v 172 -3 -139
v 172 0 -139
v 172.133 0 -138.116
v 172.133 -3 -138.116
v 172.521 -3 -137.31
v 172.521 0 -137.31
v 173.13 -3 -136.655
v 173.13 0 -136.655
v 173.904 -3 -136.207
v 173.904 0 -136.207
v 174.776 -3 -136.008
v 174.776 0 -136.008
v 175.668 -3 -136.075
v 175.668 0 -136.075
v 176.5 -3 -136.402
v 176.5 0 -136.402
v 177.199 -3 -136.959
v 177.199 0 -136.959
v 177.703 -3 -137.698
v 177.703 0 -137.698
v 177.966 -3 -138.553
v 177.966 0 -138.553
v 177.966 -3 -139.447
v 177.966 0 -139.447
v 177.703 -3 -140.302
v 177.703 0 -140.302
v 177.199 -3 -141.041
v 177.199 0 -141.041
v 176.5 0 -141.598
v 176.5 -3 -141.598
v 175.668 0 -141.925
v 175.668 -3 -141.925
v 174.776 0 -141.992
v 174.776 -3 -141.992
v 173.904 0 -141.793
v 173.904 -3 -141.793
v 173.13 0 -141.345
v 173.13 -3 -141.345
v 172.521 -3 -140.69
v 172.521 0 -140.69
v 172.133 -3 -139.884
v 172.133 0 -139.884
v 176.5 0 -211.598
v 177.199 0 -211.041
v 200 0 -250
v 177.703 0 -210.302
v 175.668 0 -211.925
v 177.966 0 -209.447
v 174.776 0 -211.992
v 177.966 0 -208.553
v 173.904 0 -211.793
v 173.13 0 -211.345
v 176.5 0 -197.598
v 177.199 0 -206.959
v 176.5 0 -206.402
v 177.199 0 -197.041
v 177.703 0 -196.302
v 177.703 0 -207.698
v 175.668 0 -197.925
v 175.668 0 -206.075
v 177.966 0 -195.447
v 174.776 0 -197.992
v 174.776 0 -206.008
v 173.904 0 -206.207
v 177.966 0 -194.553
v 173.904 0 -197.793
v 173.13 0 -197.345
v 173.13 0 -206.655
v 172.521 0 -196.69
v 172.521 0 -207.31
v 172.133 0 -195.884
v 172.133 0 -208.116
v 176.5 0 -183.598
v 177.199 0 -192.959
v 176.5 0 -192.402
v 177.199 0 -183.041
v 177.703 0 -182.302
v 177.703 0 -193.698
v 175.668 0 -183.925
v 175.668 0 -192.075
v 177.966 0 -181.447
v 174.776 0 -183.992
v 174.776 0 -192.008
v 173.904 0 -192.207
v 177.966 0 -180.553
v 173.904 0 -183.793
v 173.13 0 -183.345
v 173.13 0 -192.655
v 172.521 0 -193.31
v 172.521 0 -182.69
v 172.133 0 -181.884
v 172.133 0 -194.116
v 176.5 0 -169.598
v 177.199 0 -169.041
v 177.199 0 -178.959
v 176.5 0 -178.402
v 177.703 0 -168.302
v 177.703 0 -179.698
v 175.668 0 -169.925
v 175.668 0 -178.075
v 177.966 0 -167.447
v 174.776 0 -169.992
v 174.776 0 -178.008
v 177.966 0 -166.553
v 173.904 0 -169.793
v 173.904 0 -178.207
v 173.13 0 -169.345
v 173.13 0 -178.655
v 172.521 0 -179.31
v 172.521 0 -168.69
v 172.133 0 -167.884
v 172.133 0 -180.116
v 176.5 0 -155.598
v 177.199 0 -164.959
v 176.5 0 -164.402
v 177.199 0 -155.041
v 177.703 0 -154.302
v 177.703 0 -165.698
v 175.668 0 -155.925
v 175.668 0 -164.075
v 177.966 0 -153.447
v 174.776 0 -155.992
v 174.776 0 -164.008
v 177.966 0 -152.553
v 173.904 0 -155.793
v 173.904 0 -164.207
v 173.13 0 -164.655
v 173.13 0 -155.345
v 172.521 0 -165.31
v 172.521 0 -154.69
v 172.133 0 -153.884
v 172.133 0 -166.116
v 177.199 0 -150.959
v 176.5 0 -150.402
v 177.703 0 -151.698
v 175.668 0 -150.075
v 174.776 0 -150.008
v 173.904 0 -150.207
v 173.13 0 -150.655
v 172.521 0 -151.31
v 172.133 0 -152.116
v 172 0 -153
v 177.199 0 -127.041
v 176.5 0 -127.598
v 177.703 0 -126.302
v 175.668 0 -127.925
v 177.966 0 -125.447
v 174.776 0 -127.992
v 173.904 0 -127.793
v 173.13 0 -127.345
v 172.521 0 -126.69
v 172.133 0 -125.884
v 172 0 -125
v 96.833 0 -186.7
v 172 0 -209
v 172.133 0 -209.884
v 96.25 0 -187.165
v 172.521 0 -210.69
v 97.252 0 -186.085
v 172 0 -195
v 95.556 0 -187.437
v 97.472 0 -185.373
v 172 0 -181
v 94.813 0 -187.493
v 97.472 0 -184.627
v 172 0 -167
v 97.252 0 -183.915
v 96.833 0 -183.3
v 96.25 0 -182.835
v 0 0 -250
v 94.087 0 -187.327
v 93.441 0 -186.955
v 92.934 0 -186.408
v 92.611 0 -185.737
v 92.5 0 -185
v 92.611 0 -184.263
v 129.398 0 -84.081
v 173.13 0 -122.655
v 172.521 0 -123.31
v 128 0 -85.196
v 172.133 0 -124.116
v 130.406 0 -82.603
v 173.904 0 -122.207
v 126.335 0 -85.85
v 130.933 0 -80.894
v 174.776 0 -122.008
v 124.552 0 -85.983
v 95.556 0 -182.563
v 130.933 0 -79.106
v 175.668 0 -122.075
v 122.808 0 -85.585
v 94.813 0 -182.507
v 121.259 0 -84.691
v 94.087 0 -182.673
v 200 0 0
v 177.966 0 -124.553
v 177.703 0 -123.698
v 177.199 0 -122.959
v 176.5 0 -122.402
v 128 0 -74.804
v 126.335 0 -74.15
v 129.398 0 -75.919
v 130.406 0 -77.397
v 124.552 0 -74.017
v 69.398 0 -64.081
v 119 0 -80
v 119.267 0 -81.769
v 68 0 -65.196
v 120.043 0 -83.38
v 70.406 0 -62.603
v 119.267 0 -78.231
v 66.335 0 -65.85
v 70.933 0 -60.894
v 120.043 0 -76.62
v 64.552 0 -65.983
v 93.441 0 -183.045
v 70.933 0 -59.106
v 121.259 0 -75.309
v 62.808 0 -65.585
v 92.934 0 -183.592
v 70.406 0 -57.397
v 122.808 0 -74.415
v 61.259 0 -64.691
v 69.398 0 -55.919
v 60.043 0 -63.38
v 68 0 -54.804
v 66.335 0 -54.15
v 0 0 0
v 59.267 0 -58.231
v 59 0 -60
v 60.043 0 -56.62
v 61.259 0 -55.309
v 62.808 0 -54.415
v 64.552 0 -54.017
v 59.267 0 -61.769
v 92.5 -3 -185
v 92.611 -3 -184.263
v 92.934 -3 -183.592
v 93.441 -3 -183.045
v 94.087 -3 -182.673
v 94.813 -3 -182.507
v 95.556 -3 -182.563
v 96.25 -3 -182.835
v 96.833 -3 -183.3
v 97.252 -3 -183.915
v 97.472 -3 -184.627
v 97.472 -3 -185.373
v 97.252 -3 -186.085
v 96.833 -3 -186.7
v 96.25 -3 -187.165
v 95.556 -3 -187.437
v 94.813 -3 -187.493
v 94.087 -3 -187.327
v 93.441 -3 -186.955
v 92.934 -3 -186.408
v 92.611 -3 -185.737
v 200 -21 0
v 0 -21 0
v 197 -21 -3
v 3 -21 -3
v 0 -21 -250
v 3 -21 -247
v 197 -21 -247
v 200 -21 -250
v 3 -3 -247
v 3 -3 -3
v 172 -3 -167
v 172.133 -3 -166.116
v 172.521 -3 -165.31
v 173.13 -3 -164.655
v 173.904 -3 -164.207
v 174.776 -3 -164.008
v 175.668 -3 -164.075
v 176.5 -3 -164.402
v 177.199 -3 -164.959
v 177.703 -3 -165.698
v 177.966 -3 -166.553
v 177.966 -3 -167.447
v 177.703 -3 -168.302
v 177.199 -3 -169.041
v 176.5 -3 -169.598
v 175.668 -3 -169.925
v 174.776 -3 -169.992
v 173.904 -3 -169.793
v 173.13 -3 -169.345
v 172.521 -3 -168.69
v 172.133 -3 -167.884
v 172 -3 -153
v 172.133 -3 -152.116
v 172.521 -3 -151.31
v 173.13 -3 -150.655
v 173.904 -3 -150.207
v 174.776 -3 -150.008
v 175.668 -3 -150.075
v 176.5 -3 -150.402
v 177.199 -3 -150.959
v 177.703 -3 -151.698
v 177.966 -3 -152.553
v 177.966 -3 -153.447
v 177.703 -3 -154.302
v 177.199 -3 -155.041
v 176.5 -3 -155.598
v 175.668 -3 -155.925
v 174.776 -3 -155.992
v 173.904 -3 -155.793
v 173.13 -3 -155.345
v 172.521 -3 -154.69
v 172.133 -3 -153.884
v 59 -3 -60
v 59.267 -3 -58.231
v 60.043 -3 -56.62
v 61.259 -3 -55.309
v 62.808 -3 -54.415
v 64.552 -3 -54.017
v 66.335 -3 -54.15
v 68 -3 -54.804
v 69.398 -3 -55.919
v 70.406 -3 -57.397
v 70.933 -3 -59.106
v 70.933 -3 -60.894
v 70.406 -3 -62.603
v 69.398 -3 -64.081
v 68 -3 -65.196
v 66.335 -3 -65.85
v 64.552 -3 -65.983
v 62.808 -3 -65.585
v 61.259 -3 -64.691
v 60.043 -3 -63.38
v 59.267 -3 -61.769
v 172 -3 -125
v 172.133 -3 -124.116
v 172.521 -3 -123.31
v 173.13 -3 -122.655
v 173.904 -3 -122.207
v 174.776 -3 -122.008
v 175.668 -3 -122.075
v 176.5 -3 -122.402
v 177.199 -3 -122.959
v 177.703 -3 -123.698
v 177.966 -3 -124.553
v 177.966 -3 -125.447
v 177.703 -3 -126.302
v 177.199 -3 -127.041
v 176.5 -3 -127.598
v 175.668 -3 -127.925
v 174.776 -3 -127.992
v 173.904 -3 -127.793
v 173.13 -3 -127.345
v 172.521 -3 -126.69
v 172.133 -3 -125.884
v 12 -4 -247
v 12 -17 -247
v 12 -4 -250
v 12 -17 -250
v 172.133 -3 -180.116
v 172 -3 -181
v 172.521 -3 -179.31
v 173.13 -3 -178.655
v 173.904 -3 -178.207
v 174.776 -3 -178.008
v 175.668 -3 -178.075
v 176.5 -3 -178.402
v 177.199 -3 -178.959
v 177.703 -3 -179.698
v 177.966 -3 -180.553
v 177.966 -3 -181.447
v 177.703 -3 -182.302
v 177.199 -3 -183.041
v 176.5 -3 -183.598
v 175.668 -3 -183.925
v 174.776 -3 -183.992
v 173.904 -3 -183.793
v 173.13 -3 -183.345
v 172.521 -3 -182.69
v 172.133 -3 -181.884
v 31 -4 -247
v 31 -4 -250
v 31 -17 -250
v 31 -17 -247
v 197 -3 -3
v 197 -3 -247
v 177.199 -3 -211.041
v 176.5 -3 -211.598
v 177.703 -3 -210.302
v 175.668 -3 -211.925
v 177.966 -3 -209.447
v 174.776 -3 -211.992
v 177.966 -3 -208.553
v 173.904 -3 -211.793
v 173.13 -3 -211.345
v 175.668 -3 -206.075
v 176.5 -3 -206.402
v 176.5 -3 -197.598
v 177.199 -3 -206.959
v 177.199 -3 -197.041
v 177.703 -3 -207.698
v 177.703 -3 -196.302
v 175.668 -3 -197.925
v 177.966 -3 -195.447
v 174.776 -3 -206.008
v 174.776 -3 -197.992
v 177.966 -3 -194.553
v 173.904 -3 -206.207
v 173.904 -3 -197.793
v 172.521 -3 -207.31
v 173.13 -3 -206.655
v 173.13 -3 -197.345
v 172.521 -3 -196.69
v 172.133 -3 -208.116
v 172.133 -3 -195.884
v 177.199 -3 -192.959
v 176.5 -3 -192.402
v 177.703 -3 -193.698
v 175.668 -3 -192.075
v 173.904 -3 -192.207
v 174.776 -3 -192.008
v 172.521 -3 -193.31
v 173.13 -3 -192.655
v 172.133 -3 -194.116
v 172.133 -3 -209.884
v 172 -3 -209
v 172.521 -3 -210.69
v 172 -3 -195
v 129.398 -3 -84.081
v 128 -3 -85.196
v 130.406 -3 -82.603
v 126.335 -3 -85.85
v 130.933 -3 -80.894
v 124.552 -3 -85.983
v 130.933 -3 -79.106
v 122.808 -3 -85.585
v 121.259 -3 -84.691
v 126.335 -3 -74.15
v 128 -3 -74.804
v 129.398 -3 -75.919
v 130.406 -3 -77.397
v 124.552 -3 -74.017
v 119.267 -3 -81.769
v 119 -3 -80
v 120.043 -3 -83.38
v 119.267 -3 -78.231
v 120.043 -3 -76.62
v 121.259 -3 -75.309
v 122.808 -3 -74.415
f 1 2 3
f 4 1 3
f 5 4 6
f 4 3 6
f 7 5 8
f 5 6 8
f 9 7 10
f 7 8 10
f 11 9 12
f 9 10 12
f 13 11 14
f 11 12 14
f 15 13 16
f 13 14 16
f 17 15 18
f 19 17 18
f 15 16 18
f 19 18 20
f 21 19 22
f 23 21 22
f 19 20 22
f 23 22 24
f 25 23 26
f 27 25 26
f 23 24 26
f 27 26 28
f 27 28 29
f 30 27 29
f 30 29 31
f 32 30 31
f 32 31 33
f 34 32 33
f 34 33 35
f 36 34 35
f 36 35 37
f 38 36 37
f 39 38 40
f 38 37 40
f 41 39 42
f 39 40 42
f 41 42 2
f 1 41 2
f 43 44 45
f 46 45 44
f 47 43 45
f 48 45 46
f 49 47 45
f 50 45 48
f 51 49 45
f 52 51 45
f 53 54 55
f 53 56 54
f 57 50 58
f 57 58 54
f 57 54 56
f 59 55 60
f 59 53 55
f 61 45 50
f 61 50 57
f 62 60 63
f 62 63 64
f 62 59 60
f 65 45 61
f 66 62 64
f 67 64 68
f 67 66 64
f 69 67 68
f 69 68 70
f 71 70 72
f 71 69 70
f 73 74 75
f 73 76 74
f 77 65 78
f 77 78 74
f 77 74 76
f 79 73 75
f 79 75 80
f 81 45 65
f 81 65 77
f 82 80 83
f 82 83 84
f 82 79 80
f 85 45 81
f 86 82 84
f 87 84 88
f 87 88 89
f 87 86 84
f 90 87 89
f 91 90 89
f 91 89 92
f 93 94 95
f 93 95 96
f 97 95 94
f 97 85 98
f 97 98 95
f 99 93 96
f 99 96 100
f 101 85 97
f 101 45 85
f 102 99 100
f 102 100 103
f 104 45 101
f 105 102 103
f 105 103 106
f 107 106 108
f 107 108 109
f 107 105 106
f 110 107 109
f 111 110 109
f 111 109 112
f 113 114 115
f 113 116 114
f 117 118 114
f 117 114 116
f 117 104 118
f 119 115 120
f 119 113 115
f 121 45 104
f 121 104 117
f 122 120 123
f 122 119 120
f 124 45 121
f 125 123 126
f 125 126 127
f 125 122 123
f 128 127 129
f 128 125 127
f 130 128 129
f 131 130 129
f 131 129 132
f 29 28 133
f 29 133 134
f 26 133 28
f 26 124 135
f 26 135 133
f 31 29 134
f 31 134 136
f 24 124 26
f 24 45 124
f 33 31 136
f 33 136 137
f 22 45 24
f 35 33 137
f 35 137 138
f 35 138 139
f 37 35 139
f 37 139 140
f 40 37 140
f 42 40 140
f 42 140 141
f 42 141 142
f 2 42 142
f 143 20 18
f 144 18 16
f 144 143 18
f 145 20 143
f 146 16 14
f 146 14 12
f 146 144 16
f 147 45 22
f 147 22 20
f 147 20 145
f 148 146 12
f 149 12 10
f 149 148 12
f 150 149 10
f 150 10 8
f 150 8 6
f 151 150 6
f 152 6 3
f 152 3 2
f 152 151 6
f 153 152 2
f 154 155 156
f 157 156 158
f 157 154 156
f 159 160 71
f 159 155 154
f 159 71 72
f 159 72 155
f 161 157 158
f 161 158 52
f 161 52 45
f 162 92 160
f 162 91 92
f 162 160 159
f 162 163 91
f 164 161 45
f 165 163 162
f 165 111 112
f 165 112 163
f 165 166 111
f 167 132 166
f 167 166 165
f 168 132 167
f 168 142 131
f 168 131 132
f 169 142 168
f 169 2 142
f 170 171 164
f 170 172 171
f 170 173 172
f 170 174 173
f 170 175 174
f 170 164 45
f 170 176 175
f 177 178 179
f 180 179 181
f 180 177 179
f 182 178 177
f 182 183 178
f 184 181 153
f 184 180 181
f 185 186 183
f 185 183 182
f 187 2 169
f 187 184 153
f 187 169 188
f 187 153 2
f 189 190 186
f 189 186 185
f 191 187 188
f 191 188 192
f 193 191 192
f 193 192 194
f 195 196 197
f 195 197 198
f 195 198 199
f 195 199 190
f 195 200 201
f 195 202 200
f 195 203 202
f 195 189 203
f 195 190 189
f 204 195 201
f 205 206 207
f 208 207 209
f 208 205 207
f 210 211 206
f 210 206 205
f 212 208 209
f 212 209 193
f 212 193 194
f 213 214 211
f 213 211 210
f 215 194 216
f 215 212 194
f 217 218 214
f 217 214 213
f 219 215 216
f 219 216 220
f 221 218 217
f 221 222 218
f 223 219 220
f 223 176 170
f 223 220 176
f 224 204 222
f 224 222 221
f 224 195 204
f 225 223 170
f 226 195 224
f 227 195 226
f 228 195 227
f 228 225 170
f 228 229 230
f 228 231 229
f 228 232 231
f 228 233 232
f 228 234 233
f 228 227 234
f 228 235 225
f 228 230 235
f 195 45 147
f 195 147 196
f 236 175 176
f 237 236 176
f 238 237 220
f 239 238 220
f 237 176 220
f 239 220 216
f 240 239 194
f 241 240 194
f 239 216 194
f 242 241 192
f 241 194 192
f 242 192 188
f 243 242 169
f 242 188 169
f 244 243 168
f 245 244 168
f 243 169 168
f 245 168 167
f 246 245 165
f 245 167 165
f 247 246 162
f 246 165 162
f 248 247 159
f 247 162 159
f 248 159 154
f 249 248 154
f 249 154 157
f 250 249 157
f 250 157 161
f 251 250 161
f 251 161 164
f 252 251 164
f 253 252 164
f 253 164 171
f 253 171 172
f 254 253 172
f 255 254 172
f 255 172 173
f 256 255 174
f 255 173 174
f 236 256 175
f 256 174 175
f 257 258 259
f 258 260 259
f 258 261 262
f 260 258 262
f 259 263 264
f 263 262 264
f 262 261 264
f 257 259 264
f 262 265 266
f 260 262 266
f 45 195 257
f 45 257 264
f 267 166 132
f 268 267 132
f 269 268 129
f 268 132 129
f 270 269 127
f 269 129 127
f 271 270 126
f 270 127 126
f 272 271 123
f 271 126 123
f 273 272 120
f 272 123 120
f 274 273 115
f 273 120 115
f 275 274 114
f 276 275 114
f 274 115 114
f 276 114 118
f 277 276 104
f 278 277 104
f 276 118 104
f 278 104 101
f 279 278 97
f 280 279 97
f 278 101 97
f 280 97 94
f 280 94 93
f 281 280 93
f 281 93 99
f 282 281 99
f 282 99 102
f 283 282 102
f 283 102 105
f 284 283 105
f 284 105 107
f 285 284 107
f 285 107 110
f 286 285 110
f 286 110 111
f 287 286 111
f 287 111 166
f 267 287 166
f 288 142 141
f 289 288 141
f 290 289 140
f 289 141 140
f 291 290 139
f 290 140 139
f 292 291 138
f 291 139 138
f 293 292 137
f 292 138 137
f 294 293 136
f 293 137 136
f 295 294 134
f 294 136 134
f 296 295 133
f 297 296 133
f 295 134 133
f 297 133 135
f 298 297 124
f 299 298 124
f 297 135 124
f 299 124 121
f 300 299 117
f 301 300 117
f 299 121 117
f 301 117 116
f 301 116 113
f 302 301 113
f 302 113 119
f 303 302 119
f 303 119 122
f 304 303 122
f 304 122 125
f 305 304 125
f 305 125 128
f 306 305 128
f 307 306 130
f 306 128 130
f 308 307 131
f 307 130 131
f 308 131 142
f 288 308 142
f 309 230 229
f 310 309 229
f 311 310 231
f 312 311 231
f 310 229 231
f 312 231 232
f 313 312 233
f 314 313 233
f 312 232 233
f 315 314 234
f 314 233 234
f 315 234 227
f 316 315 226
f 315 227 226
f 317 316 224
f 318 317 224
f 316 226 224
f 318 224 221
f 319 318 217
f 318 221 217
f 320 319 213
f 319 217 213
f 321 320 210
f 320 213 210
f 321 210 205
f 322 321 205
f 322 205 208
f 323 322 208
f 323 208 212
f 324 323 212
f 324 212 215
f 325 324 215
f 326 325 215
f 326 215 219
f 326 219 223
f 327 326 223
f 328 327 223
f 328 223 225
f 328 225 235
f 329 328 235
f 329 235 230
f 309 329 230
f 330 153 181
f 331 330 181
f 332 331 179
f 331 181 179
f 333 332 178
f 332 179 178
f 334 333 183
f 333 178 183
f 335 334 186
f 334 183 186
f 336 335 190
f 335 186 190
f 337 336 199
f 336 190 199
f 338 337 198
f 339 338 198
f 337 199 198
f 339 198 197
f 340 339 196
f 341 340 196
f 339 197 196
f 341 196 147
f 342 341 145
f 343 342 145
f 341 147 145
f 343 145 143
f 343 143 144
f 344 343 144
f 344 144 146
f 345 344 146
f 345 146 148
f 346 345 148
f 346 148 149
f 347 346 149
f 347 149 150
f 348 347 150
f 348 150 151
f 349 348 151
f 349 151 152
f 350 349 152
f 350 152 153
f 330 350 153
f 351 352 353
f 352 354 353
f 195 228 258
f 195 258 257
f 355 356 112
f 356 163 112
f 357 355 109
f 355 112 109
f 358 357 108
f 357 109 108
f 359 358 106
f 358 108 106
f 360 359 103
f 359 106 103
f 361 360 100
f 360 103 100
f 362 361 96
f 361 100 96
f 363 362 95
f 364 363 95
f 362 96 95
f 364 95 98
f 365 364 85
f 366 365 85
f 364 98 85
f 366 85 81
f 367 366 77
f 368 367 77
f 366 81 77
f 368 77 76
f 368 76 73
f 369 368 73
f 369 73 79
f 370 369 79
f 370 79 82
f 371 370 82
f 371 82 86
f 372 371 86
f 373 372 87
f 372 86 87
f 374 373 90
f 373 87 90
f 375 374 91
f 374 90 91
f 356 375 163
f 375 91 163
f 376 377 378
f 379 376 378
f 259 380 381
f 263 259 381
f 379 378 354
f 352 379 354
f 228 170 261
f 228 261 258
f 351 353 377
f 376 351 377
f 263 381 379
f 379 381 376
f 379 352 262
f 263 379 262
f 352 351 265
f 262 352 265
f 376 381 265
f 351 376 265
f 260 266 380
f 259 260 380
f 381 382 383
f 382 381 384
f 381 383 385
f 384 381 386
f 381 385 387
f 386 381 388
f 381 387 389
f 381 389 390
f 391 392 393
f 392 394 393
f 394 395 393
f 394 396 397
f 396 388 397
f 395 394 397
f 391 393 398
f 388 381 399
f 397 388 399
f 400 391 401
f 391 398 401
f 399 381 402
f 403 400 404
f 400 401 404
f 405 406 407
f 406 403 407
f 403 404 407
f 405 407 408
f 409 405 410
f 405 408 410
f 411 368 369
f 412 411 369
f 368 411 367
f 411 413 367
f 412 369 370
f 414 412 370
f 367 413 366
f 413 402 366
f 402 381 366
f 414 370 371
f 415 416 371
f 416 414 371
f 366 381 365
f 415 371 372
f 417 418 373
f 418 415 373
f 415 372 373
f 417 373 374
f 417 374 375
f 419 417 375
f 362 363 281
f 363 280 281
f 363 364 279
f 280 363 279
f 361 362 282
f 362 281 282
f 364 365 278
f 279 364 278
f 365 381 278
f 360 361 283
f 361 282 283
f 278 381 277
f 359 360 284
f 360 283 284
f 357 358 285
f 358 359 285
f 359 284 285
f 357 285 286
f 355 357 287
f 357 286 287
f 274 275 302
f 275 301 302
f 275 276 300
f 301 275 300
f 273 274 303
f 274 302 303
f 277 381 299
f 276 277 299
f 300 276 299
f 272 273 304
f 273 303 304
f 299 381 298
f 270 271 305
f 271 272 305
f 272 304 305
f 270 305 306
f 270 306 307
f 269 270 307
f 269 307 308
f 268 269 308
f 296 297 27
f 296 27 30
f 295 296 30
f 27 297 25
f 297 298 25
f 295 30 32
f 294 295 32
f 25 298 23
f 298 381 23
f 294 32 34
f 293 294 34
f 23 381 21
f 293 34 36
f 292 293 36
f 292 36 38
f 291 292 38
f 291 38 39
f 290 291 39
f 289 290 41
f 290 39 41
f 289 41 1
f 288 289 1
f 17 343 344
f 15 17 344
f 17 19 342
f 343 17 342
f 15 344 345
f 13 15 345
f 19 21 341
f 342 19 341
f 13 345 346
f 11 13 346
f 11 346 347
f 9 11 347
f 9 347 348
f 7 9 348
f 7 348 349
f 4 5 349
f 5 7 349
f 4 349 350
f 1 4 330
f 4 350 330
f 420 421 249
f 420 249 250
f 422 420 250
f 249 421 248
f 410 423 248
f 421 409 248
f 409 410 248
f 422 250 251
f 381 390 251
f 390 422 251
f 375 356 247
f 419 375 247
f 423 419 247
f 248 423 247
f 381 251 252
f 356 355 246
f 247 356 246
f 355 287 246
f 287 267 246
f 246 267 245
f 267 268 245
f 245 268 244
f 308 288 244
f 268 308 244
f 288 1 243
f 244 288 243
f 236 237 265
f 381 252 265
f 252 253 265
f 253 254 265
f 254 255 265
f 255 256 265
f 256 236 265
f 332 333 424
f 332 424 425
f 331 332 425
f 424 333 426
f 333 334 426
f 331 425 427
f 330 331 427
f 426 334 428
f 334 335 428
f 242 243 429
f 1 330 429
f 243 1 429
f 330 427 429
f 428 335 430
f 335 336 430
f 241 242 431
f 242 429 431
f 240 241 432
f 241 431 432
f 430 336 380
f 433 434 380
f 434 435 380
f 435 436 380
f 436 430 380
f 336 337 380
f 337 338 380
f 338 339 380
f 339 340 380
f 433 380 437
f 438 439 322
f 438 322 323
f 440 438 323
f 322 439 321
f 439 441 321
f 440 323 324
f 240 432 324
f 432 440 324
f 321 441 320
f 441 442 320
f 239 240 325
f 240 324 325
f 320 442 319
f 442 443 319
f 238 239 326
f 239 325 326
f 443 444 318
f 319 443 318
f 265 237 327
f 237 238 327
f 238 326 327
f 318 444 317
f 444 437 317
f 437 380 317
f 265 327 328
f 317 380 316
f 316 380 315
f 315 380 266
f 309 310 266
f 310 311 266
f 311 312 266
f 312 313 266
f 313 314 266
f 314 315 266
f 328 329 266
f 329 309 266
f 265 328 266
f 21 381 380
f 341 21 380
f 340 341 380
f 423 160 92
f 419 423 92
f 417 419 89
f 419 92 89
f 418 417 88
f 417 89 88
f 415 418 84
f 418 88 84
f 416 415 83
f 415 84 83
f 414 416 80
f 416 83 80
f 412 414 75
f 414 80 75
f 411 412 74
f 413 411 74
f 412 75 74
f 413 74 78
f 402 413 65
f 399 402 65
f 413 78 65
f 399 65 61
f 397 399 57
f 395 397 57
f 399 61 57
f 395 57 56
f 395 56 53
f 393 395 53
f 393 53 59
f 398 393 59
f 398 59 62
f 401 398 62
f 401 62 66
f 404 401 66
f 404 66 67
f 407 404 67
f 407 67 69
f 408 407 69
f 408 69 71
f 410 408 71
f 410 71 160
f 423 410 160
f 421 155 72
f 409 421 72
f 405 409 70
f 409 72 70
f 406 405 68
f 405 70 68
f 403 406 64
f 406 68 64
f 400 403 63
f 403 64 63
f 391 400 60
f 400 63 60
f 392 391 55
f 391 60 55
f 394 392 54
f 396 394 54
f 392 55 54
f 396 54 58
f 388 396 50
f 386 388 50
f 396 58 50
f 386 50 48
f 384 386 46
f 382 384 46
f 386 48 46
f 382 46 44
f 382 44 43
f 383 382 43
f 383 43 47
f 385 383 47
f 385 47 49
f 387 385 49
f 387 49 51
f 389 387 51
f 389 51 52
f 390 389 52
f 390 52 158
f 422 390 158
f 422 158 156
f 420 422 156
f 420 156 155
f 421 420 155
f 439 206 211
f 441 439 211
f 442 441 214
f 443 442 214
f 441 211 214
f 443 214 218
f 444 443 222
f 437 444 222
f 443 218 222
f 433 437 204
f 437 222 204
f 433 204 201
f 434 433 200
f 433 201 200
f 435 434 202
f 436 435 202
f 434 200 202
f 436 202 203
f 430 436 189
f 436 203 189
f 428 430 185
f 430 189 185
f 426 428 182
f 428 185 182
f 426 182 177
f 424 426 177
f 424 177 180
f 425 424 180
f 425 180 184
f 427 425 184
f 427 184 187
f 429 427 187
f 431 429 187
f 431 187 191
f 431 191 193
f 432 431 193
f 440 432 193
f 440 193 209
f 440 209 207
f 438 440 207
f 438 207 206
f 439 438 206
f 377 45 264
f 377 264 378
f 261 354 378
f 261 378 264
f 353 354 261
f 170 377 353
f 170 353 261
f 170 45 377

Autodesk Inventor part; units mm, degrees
ref_plane "YZ Plane" through (0, 0, 0) normal (1, 0, 0) x (0, 1, 0)
ref_plane "XZ Plane" through (0, 0, 0) normal (0, 1, 0) x (-1, 0, 0)
ref_plane "XY Plane" through (0, 0, 0) normal (0, 0, 1) x (1, 0, 0)
sketch "block" plane through (0, 0, 0) normal (0, 1, 0) x (-1, 0, 0)
  line L0 (0, 0) -> (-200, 0)
  line L1 (-200, 0) -> (-200, -250)
  line L2 (-200, -250) -> (0, -250)
  line L3 (0, -250) -> (0, 0)
  dimension "d31" = 200
  dimension "d32" = 250
extrude "ext_block" add sketch "block" against normal blind 24
shell "Shell2" thickness 3 removed faces 0
sketch "lines_base" plane through (0, 0, 0) normal (0, 1, 0) x (-1, 0, 0)
  line L0 (0, 0) -> (-200, 0)
  line L1 (-200, 0) -> (-200, -250)
  line L2 (-200, -250) -> (0, -250)
  line L3 (0, -250) -> (0, 0)
  circle A0 centre (-65, -60) radius 6
  circle A1 centre (-125, -80) radius 6
  circle A2 centre (-65, -60) radius 12.5
  circle A3 centre (-65, -60) radius 8.5
  circle A4 centre (-125, -80) radius 8.5
  circle A5 centre (-125, -80) radius 12.5
  circle A6 centre (-175, -125) radius 3
  line L4 (-175, -125) -> (-175, -209)
  line L5 (-175, -125) -> (-91, -125) construction
  circle A7 centre (-175, -139) radius 3
  circle A8 centre (-175, -153) radius 3
  circle A9 centre (-175, -167) radius 3
  circle A10 centre (-175, -181) radius 3
  circle A11 centre (-175, -195) radius 3
  circle A12 centre (-175, -209) radius 3
  circle A13 centre (-95, -185) radius 2.5
  circle A14 centre (-95, -185) radius 5
  point P0 (-200, -125)
  dimension "d0" = 200
  dimension "d1" = 250
  dimension "d2" = 12
  dimension "d3" = 12
  dimension "d4" = 25
  dimension "d5" = 17
  dimension "d6" = 17
  dimension "d7" = 25
  dimension "d8" = 75
  dimension "d9" = 80
  dimension "d10" = 65
  dimension "d11" = 60
  dimension "d12" = 6
  dimension "d13" = 84
  dimension "d14" = 90
  dimension "d15" = 25
  dimension "d16" = 125
  dimension "d19" = 14
  dimension "d24" = 5
  dimension "d25" = 10
  dimension "d26" = 65
  dimension "d27" = 95
extrude "holes" cut sketch "lines_base" against normal up to surface (3 mm away) contours A0 | A1 | A6 | A7 L4 | L4 A7 | A8 L4 | L4 A8 | A9 L4 | L4 A9 | A10 L4 | L4 A10 | A11 L4 | L4 A11 | A12 | A13
sketch "Sketch4" plane through (200, 0, -250) normal (0, 0, -1) x (-1, 0, 0)
  line L0 (188, -4) -> (169, -4)
  line L1 (169, -4) -> (169, -17)
  line L2 (169, -17) -> (188, -17)
  line L3 (188, -17) -> (188, -4)
  line L4 (0, 0) -> (200, 0) projected
  line L5 (200, 0) -> (200, -24) projected
  dimension "d40" = 19
  dimension "d41" = 13
  dimension "d42" = 4
  dimension "d43" = 12
extrude "pwr_button_hole" cut sketch "Sketch4" against normal up to surface (3 mm away)
ref_plane "Work Plane1" through (7, -21, -243) normal (0, 1, 0) x (1, 0, 0)
sketch "Sketch5" plane through (7, -21, -243) normal (0, 1, 0) x (1, 0, 0)
  line L0 (-20.9366, 21.7948) -> (229.9216, 21.7948)
  line L1 (229.9216, 21.7948) -> (229.9216, -260.9184)
  line L2 (229.9216, -260.9184) -> (-20.9366, -260.9184)
  line L3 (-20.9366, -260.9184) -> (-20.9366, 21.7948)
  point P0 (-7, -243)
extrude "back_cover_cut" cut sketch "Sketch5" against normal through all
properties part number "back" material "Glass"
